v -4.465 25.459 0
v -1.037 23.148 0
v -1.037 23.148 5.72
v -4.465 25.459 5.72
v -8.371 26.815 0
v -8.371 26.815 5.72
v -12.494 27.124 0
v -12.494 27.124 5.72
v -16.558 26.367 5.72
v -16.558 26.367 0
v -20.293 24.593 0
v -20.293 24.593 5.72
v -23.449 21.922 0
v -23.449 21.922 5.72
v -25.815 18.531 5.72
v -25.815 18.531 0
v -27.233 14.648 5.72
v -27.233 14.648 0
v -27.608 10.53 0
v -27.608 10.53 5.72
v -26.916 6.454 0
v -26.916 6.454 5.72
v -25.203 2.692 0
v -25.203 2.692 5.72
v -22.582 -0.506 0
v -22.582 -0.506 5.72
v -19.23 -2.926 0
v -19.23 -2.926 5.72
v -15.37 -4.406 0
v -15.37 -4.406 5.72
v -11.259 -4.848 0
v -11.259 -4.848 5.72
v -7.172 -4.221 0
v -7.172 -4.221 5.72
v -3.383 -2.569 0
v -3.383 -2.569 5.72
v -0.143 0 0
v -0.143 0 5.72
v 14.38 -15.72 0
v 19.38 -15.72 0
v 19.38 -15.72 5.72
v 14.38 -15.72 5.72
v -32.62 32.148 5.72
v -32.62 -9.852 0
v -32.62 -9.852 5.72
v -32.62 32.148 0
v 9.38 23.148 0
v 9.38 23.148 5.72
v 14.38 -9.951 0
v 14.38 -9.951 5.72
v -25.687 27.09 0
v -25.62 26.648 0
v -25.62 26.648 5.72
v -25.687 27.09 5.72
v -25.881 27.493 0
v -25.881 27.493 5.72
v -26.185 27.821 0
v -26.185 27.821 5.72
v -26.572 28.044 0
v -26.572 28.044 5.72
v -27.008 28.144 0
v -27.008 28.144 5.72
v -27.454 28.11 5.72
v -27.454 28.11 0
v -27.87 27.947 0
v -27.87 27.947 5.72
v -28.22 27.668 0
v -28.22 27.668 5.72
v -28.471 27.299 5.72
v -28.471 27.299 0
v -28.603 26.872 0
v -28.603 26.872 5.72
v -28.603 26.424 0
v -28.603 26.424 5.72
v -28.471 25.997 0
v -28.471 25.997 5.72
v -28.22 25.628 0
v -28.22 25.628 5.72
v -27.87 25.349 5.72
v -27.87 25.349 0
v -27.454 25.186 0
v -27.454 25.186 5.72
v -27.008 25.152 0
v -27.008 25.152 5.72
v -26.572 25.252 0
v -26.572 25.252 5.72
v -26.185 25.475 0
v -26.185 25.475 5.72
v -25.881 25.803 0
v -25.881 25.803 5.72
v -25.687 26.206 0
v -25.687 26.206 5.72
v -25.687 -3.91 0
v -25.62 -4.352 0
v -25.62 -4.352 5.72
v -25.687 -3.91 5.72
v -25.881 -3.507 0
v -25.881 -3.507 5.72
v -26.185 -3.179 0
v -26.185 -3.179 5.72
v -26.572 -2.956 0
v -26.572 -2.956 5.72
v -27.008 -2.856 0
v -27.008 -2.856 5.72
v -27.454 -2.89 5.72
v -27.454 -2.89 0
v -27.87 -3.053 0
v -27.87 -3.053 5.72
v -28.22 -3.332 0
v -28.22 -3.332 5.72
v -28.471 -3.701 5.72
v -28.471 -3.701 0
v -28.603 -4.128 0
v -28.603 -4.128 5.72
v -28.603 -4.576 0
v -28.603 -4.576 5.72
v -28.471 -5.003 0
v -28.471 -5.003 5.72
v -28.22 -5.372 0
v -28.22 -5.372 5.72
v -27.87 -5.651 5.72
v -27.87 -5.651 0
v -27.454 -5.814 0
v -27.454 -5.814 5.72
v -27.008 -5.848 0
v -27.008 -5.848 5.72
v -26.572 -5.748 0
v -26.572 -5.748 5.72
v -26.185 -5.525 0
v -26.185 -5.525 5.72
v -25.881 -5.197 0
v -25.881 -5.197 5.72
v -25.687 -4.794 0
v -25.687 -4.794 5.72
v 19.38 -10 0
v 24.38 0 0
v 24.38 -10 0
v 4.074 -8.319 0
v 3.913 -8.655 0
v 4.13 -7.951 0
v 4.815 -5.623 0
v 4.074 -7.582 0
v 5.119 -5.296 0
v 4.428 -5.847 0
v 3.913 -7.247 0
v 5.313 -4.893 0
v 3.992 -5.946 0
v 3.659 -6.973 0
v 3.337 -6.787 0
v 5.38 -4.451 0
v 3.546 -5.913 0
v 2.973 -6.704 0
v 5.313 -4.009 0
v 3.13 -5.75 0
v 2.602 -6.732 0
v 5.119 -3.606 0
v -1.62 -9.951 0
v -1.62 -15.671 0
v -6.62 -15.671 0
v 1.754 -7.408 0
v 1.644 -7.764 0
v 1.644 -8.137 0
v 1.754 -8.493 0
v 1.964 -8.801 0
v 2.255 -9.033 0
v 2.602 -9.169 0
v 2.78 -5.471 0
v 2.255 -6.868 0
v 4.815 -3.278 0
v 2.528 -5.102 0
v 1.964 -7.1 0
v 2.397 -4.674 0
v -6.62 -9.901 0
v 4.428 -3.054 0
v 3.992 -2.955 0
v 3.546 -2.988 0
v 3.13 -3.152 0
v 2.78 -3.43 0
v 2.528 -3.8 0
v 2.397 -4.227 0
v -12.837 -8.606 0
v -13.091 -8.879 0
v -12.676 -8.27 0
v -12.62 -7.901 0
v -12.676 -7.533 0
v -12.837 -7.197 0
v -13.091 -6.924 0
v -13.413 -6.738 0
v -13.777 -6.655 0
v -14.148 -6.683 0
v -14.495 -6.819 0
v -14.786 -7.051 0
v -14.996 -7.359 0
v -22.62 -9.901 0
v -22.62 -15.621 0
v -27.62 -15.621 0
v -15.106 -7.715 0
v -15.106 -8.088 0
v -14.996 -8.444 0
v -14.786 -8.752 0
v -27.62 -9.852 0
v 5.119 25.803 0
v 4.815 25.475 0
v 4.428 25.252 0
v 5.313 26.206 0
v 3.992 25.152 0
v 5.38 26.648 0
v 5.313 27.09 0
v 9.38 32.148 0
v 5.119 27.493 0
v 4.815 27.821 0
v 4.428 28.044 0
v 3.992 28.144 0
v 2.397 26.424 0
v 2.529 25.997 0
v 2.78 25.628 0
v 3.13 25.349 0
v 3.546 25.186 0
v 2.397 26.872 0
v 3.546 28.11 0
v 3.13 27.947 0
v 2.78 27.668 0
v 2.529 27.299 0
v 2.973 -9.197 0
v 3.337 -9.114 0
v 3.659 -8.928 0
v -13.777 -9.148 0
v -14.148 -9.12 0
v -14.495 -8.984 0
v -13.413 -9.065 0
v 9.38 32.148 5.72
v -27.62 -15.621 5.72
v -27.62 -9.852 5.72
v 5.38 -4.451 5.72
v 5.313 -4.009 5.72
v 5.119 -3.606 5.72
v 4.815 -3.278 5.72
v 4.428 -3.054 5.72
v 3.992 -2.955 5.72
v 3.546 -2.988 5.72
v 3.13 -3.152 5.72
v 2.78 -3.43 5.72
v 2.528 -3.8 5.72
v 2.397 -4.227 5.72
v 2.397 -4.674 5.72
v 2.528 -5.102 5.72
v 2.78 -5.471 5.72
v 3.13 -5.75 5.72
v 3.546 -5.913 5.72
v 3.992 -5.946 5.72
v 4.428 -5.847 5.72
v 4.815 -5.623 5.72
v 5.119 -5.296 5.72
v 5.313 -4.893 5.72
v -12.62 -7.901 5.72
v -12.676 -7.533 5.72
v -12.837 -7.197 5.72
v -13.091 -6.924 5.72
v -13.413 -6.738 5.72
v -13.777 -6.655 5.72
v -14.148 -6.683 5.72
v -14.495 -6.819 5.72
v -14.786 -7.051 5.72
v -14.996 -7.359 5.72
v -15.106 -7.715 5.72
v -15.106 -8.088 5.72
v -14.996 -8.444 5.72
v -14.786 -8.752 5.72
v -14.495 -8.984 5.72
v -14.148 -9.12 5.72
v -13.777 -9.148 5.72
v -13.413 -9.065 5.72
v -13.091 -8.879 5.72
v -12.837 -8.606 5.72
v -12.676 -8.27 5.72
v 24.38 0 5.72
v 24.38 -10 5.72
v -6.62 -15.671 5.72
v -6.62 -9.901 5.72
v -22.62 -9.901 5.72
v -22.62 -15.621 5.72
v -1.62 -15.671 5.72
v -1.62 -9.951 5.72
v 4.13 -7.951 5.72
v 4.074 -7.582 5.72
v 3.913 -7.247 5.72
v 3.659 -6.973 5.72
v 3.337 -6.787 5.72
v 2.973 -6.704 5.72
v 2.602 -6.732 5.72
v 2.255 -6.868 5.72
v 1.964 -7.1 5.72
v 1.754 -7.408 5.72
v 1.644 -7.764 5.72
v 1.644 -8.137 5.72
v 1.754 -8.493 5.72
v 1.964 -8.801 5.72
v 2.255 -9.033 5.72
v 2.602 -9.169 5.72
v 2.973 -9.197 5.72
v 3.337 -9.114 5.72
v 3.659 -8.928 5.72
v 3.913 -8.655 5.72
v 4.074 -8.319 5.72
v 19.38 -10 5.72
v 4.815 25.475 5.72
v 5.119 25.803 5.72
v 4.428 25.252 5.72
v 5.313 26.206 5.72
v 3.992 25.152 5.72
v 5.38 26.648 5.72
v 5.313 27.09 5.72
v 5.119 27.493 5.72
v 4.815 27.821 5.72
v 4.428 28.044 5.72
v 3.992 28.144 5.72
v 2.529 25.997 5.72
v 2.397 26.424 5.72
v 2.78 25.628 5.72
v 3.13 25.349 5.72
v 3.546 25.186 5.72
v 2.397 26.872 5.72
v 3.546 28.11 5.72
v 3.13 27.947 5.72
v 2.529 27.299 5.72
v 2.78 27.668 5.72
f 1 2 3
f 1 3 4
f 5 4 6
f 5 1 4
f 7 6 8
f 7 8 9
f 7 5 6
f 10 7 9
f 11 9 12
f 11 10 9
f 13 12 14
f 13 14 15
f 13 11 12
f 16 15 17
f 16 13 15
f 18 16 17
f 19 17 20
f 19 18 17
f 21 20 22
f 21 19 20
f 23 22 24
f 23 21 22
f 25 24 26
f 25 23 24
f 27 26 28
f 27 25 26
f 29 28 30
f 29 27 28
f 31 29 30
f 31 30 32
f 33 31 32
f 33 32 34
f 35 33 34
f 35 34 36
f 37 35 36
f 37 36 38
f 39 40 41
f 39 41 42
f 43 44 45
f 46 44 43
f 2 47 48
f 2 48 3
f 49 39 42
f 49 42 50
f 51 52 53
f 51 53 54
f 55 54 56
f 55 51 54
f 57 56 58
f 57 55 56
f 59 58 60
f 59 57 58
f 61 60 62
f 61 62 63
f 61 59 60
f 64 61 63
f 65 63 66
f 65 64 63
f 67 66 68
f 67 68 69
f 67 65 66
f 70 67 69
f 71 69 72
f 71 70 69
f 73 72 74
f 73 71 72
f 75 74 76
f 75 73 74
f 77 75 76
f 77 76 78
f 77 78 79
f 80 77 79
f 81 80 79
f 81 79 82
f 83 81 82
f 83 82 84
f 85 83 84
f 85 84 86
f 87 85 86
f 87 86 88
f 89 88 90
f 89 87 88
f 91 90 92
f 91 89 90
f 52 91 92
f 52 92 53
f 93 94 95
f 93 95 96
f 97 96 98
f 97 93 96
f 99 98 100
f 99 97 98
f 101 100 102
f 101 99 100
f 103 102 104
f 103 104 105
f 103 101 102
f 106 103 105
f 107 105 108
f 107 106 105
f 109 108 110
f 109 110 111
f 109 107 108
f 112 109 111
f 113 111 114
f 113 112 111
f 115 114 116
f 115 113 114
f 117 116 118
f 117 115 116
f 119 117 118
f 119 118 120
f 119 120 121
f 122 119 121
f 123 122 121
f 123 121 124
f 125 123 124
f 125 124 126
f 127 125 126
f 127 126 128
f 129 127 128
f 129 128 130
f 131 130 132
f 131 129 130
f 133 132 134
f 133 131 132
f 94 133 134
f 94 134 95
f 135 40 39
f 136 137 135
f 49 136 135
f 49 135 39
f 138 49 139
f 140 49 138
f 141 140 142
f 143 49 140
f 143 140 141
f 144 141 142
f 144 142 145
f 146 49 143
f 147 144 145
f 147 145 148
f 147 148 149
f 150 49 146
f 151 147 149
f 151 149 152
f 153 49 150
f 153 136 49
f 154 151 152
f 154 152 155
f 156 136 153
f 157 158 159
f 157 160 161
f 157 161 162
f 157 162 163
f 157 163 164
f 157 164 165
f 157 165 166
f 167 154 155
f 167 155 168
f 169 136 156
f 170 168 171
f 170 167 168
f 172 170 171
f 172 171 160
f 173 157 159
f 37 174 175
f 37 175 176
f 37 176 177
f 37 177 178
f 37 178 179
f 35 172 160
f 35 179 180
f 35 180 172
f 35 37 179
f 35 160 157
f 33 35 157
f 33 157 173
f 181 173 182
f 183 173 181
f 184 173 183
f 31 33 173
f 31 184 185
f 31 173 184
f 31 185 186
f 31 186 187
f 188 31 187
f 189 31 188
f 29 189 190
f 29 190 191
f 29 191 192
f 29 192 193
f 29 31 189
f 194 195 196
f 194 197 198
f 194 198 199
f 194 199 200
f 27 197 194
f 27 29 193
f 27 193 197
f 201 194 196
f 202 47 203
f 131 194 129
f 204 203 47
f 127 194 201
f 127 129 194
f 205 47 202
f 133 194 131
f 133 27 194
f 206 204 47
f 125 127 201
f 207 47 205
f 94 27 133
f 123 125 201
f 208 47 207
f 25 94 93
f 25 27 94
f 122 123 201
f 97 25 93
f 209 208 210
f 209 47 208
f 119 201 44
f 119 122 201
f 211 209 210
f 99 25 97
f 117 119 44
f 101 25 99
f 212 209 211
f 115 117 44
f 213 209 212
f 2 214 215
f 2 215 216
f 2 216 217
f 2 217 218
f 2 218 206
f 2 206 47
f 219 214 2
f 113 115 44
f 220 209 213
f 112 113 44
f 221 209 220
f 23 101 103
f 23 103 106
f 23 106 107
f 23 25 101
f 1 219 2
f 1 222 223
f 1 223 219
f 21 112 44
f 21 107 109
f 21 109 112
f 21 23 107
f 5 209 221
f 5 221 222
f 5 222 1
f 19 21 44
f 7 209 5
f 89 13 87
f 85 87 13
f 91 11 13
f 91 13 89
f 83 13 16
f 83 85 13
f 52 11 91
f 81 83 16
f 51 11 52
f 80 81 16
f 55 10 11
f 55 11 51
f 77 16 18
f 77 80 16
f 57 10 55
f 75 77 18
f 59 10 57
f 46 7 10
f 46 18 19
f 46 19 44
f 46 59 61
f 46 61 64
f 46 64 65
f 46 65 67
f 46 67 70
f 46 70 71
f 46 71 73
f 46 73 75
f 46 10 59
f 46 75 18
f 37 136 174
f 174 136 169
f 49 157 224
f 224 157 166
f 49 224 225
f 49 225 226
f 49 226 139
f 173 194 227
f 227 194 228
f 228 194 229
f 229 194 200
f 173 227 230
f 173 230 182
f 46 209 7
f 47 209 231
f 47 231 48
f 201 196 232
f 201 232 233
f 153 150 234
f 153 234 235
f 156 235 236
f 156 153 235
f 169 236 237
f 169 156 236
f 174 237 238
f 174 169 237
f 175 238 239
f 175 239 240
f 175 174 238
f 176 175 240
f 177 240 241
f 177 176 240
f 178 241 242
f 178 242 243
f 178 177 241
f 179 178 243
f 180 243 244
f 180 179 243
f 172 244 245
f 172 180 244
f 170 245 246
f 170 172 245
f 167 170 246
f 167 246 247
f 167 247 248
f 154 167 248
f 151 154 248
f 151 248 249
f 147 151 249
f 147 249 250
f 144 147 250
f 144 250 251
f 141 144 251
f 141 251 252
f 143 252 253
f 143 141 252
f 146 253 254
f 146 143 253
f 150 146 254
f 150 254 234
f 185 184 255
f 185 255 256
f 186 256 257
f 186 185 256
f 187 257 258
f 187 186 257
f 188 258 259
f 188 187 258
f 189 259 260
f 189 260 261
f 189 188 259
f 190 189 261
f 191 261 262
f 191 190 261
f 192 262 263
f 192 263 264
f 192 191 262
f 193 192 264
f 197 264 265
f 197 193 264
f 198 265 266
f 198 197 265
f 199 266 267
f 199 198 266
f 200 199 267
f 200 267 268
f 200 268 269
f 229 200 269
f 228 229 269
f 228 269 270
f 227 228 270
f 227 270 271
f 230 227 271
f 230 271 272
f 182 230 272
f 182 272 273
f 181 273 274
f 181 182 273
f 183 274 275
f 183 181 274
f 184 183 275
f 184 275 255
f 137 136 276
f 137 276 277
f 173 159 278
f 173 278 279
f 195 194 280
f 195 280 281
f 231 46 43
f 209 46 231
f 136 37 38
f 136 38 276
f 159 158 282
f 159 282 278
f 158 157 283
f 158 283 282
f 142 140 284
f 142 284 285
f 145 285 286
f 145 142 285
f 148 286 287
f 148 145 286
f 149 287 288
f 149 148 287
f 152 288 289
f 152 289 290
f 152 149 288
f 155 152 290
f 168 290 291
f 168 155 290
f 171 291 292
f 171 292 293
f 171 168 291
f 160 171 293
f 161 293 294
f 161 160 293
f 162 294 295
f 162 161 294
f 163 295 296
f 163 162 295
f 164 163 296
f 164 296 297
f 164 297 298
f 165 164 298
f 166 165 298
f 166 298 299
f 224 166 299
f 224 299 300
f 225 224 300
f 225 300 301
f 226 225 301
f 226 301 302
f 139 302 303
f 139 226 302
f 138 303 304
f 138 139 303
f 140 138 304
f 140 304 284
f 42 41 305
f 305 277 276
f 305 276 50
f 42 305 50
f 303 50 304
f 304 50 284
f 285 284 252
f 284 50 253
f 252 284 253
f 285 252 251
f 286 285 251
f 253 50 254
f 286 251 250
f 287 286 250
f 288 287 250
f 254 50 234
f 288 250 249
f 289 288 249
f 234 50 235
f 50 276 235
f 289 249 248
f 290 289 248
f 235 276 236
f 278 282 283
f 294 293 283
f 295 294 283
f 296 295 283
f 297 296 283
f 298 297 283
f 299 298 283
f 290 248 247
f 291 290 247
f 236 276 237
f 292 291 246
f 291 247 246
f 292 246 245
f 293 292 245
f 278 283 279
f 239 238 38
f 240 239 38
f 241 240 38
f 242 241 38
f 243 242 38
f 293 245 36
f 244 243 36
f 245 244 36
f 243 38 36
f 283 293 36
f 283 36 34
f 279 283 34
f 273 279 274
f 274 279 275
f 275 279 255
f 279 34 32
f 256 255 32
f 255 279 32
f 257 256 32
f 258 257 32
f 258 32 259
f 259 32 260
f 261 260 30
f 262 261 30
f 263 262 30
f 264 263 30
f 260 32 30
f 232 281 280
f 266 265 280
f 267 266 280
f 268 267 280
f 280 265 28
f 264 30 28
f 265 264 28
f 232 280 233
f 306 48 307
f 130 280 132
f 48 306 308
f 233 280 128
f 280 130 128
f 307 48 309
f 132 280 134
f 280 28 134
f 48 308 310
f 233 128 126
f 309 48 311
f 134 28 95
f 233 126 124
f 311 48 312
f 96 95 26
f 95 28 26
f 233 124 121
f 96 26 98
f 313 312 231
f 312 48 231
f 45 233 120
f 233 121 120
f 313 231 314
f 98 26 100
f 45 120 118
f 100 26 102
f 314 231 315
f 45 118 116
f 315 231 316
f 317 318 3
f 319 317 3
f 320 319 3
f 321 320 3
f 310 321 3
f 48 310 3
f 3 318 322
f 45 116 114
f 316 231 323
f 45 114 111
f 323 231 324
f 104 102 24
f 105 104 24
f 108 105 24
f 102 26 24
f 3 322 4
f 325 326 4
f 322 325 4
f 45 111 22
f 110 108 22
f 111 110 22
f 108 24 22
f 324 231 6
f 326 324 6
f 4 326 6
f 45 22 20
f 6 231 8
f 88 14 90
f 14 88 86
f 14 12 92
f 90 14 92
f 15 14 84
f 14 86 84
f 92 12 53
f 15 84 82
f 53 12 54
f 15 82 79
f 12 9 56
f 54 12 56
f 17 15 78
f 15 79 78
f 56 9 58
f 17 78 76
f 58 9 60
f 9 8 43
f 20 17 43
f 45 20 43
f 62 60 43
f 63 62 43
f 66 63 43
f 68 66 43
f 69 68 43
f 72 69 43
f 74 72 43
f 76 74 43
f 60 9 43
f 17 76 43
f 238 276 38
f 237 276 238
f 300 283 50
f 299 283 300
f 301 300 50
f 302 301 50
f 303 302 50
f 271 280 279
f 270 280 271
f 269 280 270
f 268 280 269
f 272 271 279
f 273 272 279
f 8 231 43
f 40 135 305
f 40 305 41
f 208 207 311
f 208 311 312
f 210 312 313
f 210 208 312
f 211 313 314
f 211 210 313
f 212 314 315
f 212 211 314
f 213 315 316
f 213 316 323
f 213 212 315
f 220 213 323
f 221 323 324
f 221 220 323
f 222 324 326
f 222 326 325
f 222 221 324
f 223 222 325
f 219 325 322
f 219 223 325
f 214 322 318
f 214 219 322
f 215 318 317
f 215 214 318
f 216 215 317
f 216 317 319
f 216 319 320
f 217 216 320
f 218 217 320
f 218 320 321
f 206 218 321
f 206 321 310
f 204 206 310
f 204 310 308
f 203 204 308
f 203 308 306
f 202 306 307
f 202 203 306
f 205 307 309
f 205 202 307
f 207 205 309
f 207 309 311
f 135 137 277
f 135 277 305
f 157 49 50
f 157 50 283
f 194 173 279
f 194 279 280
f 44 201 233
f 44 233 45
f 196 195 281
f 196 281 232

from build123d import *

# Parameters (mm, degrees)
SKETCH1_R           = 1.25
SKETCH1_R_2         = 1.5
BOSS_EXTRUDE1_DEPTH = 5.72


with BuildPart() as part:
    # Sketch1 → Boss-Extrude1 (new body)
    with BuildSketch(Plane.XY):
        with BuildLine():
            Line((9.38, 23.147938931), (-1.036994756, 23.147938931))
            ThreePointArc((-1.036994756, 23.147938931), (-27.608078489, 10.53040656), (-0.142915981, 0))
            Line((-0.142915981, 0), (24.38, 0))
            Line((24.38, 0), (24.38, -10))
            Line((24.38, -10), (19.38, -10))
            Line((19.38, -10), (19.38, -15.72))
            Line((19.38, -15.72), (14.38, -15.72))
            Line((14.38, -15.72), (14.38, -9.950687023))
            Line((14.38, -9.950687023), (-1.62, -9.950687023))
            Line((-1.62, -9.950687023), (-1.62, -15.670687023))
            Line((-1.62, -15.670687023), (-6.62, -15.670687023))
            Line((-6.62, -15.670687023), (-6.62, -9.901374046))
            Line((-6.62, -9.901374046), (-22.62, -9.901374046))
            Line((-22.62, -9.901374046), (-22.62, -15.621374046))
            Line((-22.62, -15.621374046), (-27.62, -15.621374046))
            Line((-27.62, -15.621374046), (-27.62, -9.852061069))
            Line((-27.62, -9.852061069), (-32.62, -9.852061069))
            Line((-32.62, -9.852061069), (-32.62, 32.147938931))
            Line((-32.62, 32.147938931), (9.38, 32.147938931))
            Line((9.38, 32.147938931), (9.38, 23.147938931))
        make_face()
        with Locations((2.88, -7.950687023)):
            Circle(SKETCH1_R, mode=Mode.SUBTRACT)
        with Locations((-13.87, -7.901374046)):
            Circle(SKETCH1_R, mode=Mode.SUBTRACT)
        with Locations((3.879843111, -4.450687023)):
            Circle(SKETCH1_R_2, mode=Mode.SUBTRACT)
        with Locations((-27.12, -4.352061069)):
            Circle(SKETCH1_R_2, mode=Mode.SUBTRACT)
        with Locations((-27.12, 26.647938931)):
            Circle(SKETCH1_R_2, mode=Mode.SUBTRACT)
        with Locations((3.88, 26.647938931)):
            Circle(SKETCH1_R_2, mode=Mode.SUBTRACT)
    extrude(amount=BOSS_EXTRUDE1_DEPTH)


solid = part.part
